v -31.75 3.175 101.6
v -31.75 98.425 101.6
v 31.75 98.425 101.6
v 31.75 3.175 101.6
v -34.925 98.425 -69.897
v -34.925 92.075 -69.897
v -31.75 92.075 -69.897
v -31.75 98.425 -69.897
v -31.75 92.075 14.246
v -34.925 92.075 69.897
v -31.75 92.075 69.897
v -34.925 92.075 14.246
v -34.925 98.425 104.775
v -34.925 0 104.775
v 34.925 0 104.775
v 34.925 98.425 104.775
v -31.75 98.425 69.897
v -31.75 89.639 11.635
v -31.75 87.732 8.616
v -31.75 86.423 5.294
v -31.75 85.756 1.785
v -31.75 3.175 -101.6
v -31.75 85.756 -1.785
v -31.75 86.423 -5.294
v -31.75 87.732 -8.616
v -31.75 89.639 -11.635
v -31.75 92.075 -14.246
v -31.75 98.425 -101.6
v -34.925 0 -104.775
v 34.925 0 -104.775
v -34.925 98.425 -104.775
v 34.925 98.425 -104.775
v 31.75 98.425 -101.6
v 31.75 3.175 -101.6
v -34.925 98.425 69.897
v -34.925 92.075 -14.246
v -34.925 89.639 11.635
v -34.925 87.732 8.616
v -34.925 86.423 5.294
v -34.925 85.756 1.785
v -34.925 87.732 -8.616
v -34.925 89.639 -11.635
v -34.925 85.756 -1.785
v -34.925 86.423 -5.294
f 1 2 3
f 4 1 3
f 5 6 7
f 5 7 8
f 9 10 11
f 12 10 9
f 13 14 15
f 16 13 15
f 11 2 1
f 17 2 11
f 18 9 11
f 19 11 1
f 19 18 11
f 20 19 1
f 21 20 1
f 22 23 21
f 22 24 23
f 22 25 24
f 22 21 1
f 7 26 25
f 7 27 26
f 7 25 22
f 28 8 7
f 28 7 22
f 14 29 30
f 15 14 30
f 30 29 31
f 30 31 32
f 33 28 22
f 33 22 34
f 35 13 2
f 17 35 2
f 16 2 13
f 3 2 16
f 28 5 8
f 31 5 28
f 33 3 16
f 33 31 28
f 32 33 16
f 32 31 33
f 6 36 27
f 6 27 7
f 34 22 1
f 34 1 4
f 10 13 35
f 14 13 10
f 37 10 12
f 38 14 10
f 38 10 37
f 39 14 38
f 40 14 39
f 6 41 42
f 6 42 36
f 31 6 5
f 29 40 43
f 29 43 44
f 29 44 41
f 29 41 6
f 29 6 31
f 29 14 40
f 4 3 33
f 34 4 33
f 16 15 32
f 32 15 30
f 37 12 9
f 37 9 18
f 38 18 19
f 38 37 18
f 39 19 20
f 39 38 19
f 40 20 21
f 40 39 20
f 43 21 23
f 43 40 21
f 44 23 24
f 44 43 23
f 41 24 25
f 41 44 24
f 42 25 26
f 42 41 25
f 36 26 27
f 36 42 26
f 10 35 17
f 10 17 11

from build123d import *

# Parameters (mm, degrees)
SKETCH1_W           = 69.85
SKETCH1_H           = 209.55
BOSS_EXTRUDE1_DEPTH = 98.425
SKETCH2_W           = 63.5
SKETCH2_H           = 203.2
CUT_EXTRUDE1_DEPTH  = 95.25
CUT_EXTRUDE2_DEPTH  = 3.175


with BuildPart() as part:
    # Sketch1 → Boss-Extrude1 (new body)
    with BuildSketch(Plane(origin=(0, 0, 0), x_dir=(1, 0, 0), z_dir=(0, 1, 0))):
        Rectangle(SKETCH1_W, SKETCH1_H)
    extrude(amount=BOSS_EXTRUDE1_DEPTH)

    # Sketch2 → Cut-Extrude1 (cut)
    with BuildSketch(Plane(origin=(0, 98.425, 0), x_dir=(1, 0, 0), z_dir=(0, 1, 0))):
        Rectangle(SKETCH2_W, SKETCH2_H)
    extrude(amount=-CUT_EXTRUDE1_DEPTH, mode=Mode.SUBTRACT)

    # Sketch3 → Cut-Extrude2 (cut)
    with BuildSketch(Plane.ZY.offset(34.925)):
        with BuildLine():
            Line((-69.896994772, 98.425), (-69.896994772, 178.106960935))
            Line((-69.896994772, 178.106960935), (69.896994772, 178.106960935))
            Line((69.896994772, 178.106960935), (69.896994772, 98.425))
            Line((69.896994772, 98.425), (69.896994772, 92.075))
            Line((69.896994772, 92.075), (14.246026429, 92.075))
            ThreePointArc((14.246026429, 92.075), (0, 85.672261798), (-14.246026429, 92.075))
            Line((-14.246026429, 92.075), (-69.896994772, 92.075))
            Line((-69.896994772, 92.075), (-69.896994772, 98.425))
        make_face()
    extrude(amount=-CUT_EXTRUDE2_DEPTH, mode=Mode.SUBTRACT)


solid = part.part
